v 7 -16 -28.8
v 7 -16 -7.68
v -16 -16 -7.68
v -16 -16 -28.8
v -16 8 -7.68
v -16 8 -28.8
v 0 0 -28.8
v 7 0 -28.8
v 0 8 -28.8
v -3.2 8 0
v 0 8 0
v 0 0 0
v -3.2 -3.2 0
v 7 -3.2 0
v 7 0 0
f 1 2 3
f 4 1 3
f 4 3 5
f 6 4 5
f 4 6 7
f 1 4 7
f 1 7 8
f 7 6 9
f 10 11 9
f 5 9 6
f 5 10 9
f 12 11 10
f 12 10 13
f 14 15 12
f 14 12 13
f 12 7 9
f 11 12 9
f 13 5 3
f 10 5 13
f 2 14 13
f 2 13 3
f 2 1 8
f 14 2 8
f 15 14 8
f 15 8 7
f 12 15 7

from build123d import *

# Parameters (mm, degrees)
PAD014_DEPTH    = 28.8
POCKET011_DEPTH = 24
POCKET012_DEPTH = 24
SKETCH112_W     = 1
SKETCH112_H     = 16
POCKET028_DEPTH = 30
PAD141_DEPTH    = 23
PAD142_DEPTH    = 24
POCKET056_DEPTH = 24
POCKET057_DEPTH = 23


with BuildPart() as part:
    # Sketch025 (on Face52 of Binder010) → Pad014 (new body)
    with BuildSketch(Plane.XY.offset(-28.8)):
        Polygon((0, 0), (0, 8), (-16, 8), (-16, -16), (8, -16), (8, 0), align=None)
    extrude(amount=PAD014_DEPTH)

    # Sketch026 (on Face5 of Pad014) → Pocket011 (cut)
    with BuildSketch(Plane.YZ.offset(8)):
        Polygon((-16, -9.6), (0, 0), (-16, 0), align=None)
    extrude(amount=-POCKET011_DEPTH, mode=Mode.SUBTRACT)

    # Sketch027 (on Face3 of Pocket011) → Pocket012 (cut)
    with BuildSketch(Plane(origin=(0, 8, 0), x_dir=(-1, 0, 0), z_dir=(0, 1, 0))):
        Polygon((16, -9.6), (0, 0), (16, 0), align=None)
    extrude(amount=-POCKET012_DEPTH, mode=Mode.SUBTRACT)

    # Sketch112 (on Face4 of Pocket012) → Pocket028 (cut)
    with BuildSketch(Plane(origin=(0, 0, -28.8), x_dir=(1, 0, 0), z_dir=(0, 0, -1))):
        with Locations((7.5, 8)):
            Rectangle(SKETCH112_W, SKETCH112_H)
    extrude(amount=-POCKET028_DEPTH, mode=Mode.SUBTRACT)

    # Sketch137 (on Face7 of Pocket028) → Pad141 (join)
    with BuildSketch(Plane.YZ.offset(7)):
        Polygon((0, 0), (-3.2, 0), (-16, -7.68), (-16, -10.88), (-3.2, -3.2), (0, -3.2), align=None)
    extrude(amount=-PAD141_DEPTH)

    # Sketch167 → Pad142 (join)
    with BuildSketch(Plane(origin=(0, 8, 0), x_dir=(-1, 0, 0), z_dir=(0, 1, 0))):
        Polygon((0, 0), (0, -3.2), (3.2, -3.2), (16, -10.88), (16, -7.68), (3.2, 0), align=None)
    extrude(amount=-PAD142_DEPTH)

    # Sketch170 (on Face9 of Pad142) → Pocket056 (cut)
    with BuildSketch(Plane(origin=(0, 8, 0), x_dir=(-1, 0, 0), z_dir=(0, 1, 0))):
        Polygon((3.2, 0), (16, -7.68), (16, 0), align=None)
    extrude(amount=-POCKET056_DEPTH, mode=Mode.SUBTRACT)

    # Sketch171 (on Face3 of Pocket056) → Pocket057 (cut)
    with BuildSketch(Plane.YZ.offset(7)):
        Polygon((-3.2, 0), (-16, -7.68), (-16, 0), align=None)
    extrude(amount=-POCKET057_DEPTH, mode=Mode.SUBTRACT)


solid = part.part
